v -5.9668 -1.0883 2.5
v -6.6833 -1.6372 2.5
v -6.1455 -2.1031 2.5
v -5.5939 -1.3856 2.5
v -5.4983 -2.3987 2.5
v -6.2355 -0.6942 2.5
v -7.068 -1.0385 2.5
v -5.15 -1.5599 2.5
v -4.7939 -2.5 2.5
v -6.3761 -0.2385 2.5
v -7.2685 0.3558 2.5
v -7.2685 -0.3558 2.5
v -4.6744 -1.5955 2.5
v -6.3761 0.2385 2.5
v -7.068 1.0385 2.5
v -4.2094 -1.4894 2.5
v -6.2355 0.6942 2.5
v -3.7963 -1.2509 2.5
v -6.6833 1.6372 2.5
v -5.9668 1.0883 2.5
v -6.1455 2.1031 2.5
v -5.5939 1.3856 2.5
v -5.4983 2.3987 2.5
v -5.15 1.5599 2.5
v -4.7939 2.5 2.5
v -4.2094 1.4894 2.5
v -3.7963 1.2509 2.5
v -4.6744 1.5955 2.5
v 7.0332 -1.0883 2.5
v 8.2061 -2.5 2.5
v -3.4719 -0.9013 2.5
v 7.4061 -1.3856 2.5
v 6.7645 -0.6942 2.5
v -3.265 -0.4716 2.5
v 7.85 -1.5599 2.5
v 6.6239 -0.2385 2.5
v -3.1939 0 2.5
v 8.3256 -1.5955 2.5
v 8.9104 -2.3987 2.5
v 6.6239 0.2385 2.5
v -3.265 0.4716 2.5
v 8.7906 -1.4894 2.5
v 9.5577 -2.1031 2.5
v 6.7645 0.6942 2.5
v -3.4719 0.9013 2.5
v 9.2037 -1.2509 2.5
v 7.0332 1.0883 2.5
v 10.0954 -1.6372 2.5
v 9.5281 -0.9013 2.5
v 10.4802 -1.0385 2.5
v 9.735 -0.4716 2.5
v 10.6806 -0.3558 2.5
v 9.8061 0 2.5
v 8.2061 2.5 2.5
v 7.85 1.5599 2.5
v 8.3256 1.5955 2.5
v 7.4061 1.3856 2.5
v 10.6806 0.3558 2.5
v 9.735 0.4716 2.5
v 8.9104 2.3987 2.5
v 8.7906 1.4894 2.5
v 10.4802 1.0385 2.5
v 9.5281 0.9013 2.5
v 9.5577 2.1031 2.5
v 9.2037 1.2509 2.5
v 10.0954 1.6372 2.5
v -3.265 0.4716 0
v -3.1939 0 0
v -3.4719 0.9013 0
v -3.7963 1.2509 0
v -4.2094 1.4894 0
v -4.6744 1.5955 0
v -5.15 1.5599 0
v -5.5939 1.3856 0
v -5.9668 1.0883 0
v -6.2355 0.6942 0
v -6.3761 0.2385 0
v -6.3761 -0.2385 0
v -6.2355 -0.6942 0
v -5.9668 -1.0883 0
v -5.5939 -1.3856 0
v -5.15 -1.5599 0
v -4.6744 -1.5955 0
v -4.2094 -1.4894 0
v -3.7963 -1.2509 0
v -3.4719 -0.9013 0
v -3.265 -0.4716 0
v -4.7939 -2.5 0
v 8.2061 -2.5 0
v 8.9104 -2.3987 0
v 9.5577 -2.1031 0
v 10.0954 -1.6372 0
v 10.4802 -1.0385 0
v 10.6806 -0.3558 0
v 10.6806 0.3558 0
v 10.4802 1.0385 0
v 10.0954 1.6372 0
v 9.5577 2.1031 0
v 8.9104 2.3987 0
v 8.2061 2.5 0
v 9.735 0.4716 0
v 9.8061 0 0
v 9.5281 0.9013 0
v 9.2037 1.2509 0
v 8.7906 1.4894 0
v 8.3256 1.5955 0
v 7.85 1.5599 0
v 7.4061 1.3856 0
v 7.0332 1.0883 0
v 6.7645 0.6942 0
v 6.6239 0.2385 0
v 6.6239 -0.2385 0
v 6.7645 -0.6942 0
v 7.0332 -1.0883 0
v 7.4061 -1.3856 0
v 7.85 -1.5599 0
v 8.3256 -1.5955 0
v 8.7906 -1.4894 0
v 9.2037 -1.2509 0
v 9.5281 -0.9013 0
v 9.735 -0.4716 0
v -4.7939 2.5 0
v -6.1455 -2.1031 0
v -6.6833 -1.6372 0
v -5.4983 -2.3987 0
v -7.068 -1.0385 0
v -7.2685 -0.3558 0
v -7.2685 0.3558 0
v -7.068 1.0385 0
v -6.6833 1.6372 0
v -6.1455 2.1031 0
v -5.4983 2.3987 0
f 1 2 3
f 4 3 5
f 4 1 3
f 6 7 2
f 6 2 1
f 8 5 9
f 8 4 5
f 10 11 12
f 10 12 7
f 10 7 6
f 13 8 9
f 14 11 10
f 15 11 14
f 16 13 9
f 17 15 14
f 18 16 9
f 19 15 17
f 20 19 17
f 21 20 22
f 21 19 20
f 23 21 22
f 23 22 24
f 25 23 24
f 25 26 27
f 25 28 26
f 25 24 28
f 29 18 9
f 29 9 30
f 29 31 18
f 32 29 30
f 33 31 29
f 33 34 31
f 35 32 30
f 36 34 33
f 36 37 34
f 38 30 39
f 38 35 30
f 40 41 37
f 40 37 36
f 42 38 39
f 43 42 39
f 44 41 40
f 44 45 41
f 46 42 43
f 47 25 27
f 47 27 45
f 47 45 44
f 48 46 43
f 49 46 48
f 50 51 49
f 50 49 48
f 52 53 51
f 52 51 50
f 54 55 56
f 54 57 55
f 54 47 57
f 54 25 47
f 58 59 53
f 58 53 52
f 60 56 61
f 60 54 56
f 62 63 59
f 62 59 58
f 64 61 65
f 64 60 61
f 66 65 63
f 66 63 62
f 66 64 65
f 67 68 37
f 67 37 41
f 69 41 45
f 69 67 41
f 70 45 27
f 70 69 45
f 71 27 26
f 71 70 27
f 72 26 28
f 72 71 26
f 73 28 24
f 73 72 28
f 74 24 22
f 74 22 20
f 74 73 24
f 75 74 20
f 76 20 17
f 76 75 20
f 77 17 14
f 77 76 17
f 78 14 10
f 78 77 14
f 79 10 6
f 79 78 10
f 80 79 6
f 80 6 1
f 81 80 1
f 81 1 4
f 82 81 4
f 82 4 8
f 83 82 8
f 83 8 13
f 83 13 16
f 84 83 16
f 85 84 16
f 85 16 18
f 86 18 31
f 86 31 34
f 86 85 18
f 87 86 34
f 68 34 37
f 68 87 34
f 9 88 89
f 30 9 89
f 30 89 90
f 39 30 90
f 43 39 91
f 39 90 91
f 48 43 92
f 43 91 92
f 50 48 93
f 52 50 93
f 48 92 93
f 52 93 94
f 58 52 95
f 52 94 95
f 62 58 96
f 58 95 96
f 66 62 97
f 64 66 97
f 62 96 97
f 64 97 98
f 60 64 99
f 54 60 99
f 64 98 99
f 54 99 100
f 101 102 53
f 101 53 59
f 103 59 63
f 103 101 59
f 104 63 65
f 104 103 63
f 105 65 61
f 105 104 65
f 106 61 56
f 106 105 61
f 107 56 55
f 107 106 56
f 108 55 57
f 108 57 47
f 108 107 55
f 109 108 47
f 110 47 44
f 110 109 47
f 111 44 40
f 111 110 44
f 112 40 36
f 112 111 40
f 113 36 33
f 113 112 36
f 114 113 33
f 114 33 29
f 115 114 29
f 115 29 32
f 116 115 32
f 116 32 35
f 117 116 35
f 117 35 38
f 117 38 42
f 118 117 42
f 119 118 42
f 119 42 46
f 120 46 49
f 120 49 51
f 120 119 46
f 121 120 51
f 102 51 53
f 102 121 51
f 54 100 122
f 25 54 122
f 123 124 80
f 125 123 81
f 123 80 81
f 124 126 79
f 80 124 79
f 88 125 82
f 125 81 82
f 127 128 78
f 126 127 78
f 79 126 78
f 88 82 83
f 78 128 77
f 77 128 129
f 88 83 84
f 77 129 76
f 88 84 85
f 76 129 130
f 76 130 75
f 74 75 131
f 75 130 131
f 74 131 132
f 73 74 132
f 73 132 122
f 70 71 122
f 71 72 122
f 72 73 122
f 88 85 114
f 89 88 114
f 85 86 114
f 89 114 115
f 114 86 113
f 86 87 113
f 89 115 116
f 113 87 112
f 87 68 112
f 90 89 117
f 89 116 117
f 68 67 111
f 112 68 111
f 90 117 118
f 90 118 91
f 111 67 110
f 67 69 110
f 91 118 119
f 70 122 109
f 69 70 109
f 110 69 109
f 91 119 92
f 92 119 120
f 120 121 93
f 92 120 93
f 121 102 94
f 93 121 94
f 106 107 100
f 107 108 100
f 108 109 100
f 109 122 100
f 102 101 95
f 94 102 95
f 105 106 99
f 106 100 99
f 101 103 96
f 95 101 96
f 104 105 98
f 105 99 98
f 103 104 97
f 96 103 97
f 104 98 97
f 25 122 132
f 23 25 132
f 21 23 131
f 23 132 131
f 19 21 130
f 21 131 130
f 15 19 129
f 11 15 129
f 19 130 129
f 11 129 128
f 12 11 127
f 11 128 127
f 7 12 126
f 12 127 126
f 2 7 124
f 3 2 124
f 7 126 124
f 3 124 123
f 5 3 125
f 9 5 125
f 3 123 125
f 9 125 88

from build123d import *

# Parameters (mm, degrees)
SKETCH_1_R      = 1.6
EXTRUDE_2_DEPTH = 2.5
SKETCH_2_R      = 1.6
EXTRUDE_4_DEPTH = 2.5


with BuildPart() as part:
    # 草图1 → 凸台-拉伸2 (new body)
    with BuildSketch(Plane.XY):
        with BuildLine():
            Line((-4.793926247, 2), (8.206073753, 2))
            ThreePointArc((8.206073753, 2), (10.206073753, 0), (8.206073753, -2))
            Line((8.206073753, -2), (-4.793926247, -2))
            ThreePointArc((-4.793926247, -2), (-6.793926247, 0), (-4.793926247, 2))
        make_face()
        with Locations((-4.793926247, 0)):
            Circle(SKETCH_1_R, mode=Mode.SUBTRACT)
        with Locations((8.206073753, 0)):
            Circle(SKETCH_1_R, mode=Mode.SUBTRACT)
    extrude(amount=EXTRUDE_2_DEPTH)

    # 草图2 → 凸台-拉伸4 (add)
    with BuildSketch(Plane(origin=(0, 0, 0), x_dir=(-1, 0, 0), z_dir=(0, 0, -1))):
        with BuildLine():
            Line((-8.206073753, 2.5), (4.793926247, 2.5))
            ThreePointArc((4.793926247, 2.5), (7.293926247, 0), (4.793926247, -2.5))
            Line((4.793926247, -2.5), (-8.206073753, -2.5))
            ThreePointArc((-8.206073753, -2.5), (-10.706073753, 0), (-8.206073753, 2.5))
        make_face()
        with Locations(Location((4.793926247, 0, 0), (0, 0, 180))):
            Circle(SKETCH_2_R, mode=Mode.SUBTRACT)
        with Locations(Location((-8.206073753, 0, 0), (0, 0, 180))):
            Circle(SKETCH_2_R, mode=Mode.SUBTRACT)
    extrude(amount=-EXTRUDE_4_DEPTH)


solid = part.part
